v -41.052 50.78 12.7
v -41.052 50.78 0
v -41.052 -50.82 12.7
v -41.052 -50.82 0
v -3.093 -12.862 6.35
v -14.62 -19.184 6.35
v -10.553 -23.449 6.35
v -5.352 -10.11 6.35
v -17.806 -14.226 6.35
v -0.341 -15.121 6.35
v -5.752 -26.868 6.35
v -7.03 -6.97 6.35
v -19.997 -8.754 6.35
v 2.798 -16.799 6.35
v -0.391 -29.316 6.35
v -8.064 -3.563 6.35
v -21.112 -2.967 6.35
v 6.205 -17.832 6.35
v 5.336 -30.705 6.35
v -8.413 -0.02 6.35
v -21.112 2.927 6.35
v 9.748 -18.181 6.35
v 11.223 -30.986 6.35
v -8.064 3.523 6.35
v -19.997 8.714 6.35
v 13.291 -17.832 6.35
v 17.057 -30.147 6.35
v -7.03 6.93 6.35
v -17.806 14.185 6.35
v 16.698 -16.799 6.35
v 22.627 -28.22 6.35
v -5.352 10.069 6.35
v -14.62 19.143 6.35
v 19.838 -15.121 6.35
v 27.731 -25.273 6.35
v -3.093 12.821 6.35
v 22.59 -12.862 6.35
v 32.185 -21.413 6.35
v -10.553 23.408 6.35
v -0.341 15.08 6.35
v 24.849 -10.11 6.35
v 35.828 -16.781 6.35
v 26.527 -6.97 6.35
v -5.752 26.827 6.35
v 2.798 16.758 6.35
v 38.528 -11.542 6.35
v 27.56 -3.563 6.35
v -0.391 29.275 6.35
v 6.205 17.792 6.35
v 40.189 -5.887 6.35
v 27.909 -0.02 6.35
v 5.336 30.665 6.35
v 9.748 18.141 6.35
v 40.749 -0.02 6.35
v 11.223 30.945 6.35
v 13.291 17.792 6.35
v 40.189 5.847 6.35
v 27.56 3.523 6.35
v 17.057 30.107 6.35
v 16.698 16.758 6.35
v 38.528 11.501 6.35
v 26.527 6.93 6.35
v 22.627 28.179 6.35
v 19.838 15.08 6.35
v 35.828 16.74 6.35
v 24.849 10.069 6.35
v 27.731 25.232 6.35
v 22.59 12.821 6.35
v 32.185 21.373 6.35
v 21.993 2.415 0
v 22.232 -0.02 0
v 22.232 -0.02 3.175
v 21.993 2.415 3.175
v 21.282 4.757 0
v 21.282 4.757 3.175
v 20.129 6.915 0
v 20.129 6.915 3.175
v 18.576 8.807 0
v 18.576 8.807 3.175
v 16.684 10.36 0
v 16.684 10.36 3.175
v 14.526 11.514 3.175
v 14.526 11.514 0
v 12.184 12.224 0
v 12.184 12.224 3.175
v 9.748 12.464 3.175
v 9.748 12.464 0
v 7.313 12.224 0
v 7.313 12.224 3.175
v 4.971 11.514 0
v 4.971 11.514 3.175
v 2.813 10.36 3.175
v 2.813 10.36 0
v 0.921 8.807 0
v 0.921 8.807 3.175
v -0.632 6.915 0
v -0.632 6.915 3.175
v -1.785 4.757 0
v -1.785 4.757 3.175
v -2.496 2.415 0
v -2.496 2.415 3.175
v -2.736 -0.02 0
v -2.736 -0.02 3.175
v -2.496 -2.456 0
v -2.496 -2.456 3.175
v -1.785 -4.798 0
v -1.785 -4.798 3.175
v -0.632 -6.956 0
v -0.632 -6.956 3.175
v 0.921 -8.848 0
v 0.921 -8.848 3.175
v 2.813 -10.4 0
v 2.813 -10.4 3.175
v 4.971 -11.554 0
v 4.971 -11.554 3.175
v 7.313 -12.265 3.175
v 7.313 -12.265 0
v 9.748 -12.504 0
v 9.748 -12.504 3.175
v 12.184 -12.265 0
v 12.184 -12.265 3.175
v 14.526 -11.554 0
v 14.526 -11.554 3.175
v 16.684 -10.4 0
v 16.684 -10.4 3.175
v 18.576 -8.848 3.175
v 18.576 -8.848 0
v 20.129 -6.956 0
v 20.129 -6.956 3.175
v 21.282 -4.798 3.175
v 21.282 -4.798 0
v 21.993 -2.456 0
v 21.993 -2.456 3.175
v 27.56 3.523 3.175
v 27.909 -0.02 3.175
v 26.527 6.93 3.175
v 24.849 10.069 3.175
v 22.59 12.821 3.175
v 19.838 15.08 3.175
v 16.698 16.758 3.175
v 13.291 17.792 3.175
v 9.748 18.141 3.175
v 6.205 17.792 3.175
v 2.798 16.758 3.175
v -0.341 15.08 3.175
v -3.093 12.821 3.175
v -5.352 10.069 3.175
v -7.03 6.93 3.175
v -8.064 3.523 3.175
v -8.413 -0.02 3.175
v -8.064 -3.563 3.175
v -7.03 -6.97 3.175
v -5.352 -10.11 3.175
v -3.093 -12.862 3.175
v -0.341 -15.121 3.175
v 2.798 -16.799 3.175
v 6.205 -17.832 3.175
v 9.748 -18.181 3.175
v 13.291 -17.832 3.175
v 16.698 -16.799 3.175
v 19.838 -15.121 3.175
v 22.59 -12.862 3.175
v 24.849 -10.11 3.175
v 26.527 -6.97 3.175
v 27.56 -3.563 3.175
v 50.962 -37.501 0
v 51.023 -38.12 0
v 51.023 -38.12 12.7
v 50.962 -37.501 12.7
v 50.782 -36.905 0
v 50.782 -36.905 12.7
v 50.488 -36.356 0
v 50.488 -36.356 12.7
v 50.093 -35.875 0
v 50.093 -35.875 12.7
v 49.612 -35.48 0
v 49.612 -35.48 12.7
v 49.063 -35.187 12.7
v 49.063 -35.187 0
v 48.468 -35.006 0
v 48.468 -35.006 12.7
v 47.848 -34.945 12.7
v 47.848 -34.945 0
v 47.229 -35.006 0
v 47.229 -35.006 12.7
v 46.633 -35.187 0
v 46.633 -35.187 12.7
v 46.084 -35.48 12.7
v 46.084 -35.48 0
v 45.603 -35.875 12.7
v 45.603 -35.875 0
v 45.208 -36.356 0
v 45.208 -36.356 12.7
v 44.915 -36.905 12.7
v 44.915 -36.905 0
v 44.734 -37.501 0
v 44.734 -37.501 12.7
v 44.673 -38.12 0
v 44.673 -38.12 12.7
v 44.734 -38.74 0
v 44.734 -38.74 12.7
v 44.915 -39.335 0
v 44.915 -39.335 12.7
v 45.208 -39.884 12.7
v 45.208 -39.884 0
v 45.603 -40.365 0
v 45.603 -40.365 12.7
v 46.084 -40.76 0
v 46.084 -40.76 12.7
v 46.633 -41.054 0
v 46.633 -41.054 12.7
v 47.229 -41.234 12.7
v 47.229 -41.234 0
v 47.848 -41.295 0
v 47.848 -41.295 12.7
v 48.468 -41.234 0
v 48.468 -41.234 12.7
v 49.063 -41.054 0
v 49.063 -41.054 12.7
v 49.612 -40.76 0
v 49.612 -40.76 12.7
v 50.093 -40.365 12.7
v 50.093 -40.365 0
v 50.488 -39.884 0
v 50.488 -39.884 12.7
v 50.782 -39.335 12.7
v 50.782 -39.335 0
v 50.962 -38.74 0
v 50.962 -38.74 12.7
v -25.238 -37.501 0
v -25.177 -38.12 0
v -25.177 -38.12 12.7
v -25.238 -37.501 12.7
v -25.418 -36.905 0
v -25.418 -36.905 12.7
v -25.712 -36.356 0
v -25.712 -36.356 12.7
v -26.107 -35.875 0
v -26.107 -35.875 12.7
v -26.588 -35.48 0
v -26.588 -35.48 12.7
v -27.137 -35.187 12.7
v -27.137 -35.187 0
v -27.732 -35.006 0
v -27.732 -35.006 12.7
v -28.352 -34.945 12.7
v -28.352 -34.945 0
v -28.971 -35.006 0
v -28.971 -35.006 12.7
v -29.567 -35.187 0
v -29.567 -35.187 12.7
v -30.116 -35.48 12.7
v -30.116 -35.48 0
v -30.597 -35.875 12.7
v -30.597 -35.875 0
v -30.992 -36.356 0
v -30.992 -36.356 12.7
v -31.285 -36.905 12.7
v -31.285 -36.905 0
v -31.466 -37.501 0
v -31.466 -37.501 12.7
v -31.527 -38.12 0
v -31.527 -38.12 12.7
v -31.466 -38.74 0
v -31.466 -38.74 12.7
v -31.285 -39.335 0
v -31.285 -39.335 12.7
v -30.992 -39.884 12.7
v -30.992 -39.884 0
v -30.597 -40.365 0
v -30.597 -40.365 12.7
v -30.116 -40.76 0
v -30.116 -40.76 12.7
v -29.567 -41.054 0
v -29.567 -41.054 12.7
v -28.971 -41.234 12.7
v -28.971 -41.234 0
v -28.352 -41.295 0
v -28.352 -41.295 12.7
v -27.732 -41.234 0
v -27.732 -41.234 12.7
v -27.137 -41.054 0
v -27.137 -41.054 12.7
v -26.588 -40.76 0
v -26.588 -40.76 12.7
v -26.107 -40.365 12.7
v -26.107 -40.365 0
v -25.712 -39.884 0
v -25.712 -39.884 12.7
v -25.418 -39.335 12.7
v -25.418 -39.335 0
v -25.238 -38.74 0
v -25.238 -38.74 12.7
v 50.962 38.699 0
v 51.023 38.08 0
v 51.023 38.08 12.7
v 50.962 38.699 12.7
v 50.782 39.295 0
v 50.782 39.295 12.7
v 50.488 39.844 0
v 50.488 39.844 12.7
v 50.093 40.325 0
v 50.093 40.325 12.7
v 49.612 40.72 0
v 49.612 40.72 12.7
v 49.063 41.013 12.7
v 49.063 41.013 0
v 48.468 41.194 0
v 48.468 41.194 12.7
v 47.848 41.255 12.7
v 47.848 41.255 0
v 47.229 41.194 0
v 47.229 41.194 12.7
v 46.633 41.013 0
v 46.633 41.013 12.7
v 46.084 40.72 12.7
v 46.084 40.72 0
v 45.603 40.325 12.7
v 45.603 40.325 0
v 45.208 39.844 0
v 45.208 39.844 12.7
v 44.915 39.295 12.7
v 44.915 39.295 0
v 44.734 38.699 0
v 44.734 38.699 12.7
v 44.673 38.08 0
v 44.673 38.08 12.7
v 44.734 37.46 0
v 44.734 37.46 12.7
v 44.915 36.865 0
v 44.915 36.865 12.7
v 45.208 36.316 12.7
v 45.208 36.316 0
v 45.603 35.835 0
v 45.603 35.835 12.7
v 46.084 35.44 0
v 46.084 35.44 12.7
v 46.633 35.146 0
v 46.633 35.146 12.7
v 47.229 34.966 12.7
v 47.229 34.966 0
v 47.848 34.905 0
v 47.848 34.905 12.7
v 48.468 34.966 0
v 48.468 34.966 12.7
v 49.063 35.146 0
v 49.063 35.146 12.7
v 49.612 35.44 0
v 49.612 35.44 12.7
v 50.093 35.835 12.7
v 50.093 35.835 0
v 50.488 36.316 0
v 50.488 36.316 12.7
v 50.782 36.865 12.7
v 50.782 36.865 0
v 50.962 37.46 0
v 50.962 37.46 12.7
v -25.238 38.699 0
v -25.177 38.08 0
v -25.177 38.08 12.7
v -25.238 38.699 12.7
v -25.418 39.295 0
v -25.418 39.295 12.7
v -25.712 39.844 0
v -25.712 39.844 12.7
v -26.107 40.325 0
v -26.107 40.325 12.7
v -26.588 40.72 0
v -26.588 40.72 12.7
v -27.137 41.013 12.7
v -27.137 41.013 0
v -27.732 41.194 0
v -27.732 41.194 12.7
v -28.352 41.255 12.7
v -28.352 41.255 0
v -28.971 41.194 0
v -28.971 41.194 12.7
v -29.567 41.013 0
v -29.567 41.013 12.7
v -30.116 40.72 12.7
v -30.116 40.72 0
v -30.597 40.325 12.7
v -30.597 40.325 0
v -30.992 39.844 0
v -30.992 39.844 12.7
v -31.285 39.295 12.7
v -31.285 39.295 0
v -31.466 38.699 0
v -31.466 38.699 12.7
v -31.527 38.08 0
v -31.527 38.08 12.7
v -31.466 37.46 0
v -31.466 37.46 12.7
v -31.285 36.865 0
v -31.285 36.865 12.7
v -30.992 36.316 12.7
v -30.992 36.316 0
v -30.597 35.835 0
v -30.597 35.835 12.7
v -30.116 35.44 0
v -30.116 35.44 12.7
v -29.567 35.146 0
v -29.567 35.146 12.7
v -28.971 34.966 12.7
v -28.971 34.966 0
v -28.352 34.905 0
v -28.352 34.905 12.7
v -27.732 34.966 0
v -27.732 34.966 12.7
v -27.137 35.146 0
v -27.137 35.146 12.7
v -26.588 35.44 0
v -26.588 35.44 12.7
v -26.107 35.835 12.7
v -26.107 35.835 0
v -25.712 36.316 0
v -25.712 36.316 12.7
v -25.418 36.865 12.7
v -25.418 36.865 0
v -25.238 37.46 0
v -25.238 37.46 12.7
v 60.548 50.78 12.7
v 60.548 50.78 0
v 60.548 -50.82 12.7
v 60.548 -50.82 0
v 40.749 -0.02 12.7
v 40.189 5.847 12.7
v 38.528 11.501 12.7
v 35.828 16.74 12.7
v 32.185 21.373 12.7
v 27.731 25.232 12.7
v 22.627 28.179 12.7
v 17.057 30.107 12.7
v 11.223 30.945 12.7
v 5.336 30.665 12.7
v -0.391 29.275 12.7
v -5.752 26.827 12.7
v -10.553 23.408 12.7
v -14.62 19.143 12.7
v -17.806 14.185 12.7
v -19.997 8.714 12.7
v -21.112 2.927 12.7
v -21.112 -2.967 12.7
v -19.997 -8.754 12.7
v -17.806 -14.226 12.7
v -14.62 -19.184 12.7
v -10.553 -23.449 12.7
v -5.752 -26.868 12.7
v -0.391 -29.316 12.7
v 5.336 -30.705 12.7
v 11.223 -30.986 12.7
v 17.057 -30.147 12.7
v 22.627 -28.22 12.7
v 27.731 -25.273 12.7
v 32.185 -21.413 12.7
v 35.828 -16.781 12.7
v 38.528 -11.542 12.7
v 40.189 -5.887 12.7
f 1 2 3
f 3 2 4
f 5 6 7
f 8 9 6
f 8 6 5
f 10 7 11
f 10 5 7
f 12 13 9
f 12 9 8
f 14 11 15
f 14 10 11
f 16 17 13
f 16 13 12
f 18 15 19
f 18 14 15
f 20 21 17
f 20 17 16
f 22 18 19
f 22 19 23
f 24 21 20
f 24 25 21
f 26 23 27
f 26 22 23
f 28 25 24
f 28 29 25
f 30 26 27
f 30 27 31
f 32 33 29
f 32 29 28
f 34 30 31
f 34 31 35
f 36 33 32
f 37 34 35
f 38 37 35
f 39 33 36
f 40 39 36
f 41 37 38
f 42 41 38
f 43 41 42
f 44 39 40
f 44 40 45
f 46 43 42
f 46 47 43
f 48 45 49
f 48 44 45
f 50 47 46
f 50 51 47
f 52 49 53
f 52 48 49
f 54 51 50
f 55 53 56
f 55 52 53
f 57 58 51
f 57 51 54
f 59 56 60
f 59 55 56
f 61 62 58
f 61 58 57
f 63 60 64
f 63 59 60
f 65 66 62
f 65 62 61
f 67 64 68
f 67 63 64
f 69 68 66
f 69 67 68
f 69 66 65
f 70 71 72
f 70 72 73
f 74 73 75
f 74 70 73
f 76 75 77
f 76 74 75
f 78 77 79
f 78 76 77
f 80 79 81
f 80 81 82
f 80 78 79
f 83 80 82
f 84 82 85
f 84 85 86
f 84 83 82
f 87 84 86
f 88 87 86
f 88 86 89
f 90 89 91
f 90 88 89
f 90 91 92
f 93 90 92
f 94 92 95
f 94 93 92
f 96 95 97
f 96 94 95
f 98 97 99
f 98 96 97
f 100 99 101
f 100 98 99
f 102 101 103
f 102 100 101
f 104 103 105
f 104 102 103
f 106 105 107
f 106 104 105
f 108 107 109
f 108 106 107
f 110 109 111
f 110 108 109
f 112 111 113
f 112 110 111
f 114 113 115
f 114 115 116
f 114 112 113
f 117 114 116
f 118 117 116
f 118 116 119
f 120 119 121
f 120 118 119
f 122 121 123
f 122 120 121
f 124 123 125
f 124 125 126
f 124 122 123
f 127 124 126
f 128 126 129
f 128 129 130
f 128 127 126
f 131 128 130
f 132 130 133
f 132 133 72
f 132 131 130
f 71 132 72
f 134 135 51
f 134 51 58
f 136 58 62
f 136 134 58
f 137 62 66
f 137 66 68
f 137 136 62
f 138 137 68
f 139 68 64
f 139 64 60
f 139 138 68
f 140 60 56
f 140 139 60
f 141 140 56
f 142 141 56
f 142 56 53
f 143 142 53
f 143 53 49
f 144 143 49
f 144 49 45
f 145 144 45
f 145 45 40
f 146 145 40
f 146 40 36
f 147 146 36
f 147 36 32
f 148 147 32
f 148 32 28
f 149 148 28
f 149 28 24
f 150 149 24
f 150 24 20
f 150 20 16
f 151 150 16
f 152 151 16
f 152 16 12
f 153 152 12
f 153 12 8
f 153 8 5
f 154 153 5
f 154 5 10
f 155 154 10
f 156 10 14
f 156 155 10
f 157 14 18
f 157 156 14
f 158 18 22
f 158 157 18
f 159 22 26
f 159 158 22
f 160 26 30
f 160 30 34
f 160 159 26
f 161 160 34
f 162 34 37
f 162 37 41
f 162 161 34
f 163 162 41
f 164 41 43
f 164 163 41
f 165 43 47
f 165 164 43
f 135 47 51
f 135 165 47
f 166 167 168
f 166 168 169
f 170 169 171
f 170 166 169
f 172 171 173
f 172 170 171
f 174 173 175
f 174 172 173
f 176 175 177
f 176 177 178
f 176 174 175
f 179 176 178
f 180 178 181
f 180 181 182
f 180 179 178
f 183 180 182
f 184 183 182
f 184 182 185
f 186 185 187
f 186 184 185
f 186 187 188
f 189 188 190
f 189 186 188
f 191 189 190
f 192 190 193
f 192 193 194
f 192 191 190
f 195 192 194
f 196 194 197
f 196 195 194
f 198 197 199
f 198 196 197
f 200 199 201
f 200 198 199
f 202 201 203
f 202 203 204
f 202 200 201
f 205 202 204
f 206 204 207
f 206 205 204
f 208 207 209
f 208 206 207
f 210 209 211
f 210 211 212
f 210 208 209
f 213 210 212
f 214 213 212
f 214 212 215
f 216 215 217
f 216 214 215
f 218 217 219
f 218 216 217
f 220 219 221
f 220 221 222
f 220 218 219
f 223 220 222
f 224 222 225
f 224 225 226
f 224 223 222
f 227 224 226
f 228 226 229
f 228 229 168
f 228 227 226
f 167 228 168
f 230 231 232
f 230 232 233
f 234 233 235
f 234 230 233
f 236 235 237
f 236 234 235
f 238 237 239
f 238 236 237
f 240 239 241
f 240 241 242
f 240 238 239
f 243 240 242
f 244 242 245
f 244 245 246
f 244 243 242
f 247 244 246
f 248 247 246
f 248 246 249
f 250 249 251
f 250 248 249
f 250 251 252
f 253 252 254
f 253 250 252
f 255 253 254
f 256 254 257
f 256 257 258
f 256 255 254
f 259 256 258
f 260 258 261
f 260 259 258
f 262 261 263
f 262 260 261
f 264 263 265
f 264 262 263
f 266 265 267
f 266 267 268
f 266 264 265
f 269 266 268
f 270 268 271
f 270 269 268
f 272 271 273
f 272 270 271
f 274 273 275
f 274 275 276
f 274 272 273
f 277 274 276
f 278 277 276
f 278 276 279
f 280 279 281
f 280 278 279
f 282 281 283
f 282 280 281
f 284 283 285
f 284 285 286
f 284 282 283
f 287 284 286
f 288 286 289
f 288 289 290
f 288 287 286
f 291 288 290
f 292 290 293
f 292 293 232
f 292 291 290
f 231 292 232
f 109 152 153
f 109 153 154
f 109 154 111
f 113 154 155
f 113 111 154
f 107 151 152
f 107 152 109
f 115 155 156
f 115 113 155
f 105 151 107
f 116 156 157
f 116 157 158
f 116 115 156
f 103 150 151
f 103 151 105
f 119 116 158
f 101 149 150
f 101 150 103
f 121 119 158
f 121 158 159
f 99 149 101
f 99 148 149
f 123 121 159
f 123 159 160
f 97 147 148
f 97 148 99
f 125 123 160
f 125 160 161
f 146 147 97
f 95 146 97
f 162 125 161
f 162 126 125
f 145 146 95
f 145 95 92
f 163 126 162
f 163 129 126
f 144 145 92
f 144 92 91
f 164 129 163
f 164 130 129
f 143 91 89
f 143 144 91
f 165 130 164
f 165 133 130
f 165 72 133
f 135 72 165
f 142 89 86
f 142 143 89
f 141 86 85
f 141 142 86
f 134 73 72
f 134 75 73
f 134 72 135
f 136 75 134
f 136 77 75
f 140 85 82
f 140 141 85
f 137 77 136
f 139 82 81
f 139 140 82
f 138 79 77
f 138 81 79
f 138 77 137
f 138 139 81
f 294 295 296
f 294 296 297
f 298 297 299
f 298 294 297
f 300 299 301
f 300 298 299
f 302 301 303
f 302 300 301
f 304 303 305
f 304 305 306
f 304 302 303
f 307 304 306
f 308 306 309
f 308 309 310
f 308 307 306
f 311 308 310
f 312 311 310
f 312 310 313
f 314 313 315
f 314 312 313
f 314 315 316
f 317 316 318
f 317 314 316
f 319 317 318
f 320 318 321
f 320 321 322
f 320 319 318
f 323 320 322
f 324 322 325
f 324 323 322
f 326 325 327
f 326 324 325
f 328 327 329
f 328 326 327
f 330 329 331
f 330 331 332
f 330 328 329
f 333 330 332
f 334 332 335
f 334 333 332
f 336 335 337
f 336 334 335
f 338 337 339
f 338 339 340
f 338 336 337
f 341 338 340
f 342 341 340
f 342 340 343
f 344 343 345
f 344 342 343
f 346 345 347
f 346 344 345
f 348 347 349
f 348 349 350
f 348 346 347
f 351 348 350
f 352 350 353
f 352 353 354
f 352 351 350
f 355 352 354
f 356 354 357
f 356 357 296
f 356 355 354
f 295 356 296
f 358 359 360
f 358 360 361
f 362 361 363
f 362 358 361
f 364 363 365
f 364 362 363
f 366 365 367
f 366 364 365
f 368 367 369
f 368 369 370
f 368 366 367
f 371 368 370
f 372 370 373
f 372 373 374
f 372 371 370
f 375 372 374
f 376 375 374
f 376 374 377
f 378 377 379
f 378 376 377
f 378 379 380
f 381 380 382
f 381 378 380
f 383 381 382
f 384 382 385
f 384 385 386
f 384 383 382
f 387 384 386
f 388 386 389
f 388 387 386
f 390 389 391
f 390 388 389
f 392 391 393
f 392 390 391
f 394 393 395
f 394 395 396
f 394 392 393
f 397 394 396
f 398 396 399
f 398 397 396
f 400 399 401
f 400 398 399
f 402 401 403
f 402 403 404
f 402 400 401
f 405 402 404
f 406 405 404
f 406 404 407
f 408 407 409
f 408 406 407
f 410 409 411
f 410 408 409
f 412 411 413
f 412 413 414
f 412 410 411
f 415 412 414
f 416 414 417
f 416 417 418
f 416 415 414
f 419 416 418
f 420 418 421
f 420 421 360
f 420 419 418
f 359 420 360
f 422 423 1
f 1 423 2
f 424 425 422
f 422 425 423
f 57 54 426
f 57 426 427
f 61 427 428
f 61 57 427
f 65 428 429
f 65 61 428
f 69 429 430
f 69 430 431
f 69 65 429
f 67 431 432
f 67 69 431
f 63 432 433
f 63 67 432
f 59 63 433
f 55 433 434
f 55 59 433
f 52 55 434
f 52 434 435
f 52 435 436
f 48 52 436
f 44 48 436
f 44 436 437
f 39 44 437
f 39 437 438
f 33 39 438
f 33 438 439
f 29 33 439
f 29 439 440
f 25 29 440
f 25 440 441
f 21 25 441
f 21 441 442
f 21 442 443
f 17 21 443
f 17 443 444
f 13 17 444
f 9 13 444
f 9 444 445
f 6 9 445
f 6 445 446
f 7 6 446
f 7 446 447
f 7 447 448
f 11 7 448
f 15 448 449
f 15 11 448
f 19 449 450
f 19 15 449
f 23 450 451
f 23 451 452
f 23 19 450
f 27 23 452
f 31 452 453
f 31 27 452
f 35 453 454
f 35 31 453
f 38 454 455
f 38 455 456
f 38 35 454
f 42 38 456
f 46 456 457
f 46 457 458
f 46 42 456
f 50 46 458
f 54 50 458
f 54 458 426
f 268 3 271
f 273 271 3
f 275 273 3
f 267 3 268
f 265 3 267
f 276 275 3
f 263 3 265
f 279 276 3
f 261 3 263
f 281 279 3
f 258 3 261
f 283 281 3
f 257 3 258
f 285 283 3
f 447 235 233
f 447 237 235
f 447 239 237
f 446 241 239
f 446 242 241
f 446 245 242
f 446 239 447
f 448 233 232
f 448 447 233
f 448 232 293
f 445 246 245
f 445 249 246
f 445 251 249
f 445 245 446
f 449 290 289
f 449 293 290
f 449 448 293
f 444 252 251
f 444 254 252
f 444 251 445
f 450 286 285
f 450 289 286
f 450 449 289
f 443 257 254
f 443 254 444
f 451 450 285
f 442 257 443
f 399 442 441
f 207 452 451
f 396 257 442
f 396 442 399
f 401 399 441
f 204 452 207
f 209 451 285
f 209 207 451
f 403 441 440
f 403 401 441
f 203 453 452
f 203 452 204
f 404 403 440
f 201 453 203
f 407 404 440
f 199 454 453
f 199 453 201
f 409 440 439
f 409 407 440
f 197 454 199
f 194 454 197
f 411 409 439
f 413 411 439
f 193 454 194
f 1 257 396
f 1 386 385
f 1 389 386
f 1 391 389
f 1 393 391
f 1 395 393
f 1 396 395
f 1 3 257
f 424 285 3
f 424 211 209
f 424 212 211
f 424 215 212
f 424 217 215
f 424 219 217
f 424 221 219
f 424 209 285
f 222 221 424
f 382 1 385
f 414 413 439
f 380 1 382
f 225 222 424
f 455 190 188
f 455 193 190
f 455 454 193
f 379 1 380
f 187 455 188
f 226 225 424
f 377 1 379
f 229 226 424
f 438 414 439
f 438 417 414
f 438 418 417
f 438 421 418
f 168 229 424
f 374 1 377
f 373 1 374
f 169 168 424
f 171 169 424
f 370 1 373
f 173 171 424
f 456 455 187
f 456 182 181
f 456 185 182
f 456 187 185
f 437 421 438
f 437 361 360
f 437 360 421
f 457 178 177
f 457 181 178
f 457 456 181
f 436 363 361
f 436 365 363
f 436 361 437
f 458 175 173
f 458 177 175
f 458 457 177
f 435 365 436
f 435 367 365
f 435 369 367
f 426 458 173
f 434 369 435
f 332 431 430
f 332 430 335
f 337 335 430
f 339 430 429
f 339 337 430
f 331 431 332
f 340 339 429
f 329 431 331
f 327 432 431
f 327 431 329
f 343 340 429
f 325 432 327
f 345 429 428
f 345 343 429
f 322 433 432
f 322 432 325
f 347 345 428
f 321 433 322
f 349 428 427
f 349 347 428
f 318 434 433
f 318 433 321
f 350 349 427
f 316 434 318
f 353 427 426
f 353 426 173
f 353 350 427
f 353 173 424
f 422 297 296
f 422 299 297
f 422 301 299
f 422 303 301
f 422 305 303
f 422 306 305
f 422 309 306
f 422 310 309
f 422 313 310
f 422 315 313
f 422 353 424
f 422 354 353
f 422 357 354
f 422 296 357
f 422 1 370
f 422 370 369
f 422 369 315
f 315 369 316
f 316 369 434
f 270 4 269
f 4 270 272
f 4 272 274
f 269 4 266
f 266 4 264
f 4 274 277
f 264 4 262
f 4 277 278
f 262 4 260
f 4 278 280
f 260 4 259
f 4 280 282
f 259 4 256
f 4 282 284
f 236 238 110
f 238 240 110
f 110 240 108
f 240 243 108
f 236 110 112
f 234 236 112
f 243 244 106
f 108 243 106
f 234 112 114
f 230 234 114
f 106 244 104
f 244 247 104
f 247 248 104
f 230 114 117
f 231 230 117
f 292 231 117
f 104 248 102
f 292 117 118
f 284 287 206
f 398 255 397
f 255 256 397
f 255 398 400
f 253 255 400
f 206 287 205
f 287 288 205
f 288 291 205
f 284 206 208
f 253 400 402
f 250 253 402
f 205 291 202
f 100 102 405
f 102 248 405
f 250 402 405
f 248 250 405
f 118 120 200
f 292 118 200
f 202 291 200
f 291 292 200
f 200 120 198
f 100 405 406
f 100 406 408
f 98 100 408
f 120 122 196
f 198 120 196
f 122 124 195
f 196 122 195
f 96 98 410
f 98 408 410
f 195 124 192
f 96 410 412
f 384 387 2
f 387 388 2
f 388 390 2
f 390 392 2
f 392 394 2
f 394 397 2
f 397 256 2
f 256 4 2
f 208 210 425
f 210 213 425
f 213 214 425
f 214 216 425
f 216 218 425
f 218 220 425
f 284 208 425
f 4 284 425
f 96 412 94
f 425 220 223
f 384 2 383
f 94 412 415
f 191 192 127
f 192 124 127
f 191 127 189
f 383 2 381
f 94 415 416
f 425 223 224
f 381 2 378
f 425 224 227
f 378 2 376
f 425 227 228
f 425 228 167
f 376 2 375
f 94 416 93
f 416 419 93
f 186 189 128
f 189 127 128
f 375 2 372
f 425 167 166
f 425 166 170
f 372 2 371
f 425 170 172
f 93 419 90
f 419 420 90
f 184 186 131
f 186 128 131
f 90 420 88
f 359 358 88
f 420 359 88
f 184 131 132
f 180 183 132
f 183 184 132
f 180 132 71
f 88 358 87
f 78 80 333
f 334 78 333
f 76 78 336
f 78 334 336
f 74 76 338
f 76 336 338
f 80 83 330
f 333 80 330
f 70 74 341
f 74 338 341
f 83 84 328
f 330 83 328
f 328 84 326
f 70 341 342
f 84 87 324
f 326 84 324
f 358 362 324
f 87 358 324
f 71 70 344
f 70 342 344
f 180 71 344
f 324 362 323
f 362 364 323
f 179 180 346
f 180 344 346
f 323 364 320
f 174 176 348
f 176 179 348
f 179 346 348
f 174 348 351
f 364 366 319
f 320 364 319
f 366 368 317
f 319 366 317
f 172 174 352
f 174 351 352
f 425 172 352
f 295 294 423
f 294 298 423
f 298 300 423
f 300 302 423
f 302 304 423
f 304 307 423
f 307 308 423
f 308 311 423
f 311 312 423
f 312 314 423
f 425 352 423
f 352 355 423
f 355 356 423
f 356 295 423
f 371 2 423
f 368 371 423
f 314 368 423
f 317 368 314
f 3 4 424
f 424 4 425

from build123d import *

# Parameters (mm, degrees)
F0_R     = 3.175
F0_R_2   = 31.0007
F1_DEPTH = 12.7
F0_R_3   = 18.161
F2_DEPTH = 6.35
F0_R_4   = 12.4841
F3_DEPTH = 3.175


with BuildPart() as f1:
    # F0 (on Top) → F1 (new body)
    with BuildSketch(Plane.XY):
        Polygon((-41.051641, 50.779698), (-41.051641, 0), (-41.051641, -50.820302), (60.548359, -50.820302), (60.548359, 50.779698), align=None)
        with Locations((-28.351641, -38.120302)):
            Circle(F0_R, mode=Mode.SUBTRACT)
        with Locations((47.848359, -38.120302)):
            Circle(F0_R, mode=Mode.SUBTRACT)
        with Locations((9.748359, -0.020302)):
            Circle(F0_R_2, mode=Mode.SUBTRACT)
        with Locations((-28.351641, 38.079698)):
            Circle(F0_R, mode=Mode.SUBTRACT)
        with Locations((47.848359, 38.079698)):
            Circle(F0_R, mode=Mode.SUBTRACT)
    extrude(amount=F1_DEPTH)

    # F0 (on Top) → F2 (join)
    with BuildSketch(Plane.XY):
        with Locations((9.748359, -0.020302)):
            Circle(F0_R_2)
        with Locations((9.748359, -0.020302)):
            Circle(F0_R_3, mode=Mode.SUBTRACT)
    extrude(amount=F2_DEPTH)

    # F0 (on Top) → F3 (join)
    with BuildSketch(Plane.XY):
        with Locations((9.748359, -0.020302)):
            Circle(F0_R_3)
        with Locations((9.748359, -0.020302)):
            Circle(F0_R_4, mode=Mode.SUBTRACT)
    extrude(amount=F3_DEPTH)


solid = f1.part
